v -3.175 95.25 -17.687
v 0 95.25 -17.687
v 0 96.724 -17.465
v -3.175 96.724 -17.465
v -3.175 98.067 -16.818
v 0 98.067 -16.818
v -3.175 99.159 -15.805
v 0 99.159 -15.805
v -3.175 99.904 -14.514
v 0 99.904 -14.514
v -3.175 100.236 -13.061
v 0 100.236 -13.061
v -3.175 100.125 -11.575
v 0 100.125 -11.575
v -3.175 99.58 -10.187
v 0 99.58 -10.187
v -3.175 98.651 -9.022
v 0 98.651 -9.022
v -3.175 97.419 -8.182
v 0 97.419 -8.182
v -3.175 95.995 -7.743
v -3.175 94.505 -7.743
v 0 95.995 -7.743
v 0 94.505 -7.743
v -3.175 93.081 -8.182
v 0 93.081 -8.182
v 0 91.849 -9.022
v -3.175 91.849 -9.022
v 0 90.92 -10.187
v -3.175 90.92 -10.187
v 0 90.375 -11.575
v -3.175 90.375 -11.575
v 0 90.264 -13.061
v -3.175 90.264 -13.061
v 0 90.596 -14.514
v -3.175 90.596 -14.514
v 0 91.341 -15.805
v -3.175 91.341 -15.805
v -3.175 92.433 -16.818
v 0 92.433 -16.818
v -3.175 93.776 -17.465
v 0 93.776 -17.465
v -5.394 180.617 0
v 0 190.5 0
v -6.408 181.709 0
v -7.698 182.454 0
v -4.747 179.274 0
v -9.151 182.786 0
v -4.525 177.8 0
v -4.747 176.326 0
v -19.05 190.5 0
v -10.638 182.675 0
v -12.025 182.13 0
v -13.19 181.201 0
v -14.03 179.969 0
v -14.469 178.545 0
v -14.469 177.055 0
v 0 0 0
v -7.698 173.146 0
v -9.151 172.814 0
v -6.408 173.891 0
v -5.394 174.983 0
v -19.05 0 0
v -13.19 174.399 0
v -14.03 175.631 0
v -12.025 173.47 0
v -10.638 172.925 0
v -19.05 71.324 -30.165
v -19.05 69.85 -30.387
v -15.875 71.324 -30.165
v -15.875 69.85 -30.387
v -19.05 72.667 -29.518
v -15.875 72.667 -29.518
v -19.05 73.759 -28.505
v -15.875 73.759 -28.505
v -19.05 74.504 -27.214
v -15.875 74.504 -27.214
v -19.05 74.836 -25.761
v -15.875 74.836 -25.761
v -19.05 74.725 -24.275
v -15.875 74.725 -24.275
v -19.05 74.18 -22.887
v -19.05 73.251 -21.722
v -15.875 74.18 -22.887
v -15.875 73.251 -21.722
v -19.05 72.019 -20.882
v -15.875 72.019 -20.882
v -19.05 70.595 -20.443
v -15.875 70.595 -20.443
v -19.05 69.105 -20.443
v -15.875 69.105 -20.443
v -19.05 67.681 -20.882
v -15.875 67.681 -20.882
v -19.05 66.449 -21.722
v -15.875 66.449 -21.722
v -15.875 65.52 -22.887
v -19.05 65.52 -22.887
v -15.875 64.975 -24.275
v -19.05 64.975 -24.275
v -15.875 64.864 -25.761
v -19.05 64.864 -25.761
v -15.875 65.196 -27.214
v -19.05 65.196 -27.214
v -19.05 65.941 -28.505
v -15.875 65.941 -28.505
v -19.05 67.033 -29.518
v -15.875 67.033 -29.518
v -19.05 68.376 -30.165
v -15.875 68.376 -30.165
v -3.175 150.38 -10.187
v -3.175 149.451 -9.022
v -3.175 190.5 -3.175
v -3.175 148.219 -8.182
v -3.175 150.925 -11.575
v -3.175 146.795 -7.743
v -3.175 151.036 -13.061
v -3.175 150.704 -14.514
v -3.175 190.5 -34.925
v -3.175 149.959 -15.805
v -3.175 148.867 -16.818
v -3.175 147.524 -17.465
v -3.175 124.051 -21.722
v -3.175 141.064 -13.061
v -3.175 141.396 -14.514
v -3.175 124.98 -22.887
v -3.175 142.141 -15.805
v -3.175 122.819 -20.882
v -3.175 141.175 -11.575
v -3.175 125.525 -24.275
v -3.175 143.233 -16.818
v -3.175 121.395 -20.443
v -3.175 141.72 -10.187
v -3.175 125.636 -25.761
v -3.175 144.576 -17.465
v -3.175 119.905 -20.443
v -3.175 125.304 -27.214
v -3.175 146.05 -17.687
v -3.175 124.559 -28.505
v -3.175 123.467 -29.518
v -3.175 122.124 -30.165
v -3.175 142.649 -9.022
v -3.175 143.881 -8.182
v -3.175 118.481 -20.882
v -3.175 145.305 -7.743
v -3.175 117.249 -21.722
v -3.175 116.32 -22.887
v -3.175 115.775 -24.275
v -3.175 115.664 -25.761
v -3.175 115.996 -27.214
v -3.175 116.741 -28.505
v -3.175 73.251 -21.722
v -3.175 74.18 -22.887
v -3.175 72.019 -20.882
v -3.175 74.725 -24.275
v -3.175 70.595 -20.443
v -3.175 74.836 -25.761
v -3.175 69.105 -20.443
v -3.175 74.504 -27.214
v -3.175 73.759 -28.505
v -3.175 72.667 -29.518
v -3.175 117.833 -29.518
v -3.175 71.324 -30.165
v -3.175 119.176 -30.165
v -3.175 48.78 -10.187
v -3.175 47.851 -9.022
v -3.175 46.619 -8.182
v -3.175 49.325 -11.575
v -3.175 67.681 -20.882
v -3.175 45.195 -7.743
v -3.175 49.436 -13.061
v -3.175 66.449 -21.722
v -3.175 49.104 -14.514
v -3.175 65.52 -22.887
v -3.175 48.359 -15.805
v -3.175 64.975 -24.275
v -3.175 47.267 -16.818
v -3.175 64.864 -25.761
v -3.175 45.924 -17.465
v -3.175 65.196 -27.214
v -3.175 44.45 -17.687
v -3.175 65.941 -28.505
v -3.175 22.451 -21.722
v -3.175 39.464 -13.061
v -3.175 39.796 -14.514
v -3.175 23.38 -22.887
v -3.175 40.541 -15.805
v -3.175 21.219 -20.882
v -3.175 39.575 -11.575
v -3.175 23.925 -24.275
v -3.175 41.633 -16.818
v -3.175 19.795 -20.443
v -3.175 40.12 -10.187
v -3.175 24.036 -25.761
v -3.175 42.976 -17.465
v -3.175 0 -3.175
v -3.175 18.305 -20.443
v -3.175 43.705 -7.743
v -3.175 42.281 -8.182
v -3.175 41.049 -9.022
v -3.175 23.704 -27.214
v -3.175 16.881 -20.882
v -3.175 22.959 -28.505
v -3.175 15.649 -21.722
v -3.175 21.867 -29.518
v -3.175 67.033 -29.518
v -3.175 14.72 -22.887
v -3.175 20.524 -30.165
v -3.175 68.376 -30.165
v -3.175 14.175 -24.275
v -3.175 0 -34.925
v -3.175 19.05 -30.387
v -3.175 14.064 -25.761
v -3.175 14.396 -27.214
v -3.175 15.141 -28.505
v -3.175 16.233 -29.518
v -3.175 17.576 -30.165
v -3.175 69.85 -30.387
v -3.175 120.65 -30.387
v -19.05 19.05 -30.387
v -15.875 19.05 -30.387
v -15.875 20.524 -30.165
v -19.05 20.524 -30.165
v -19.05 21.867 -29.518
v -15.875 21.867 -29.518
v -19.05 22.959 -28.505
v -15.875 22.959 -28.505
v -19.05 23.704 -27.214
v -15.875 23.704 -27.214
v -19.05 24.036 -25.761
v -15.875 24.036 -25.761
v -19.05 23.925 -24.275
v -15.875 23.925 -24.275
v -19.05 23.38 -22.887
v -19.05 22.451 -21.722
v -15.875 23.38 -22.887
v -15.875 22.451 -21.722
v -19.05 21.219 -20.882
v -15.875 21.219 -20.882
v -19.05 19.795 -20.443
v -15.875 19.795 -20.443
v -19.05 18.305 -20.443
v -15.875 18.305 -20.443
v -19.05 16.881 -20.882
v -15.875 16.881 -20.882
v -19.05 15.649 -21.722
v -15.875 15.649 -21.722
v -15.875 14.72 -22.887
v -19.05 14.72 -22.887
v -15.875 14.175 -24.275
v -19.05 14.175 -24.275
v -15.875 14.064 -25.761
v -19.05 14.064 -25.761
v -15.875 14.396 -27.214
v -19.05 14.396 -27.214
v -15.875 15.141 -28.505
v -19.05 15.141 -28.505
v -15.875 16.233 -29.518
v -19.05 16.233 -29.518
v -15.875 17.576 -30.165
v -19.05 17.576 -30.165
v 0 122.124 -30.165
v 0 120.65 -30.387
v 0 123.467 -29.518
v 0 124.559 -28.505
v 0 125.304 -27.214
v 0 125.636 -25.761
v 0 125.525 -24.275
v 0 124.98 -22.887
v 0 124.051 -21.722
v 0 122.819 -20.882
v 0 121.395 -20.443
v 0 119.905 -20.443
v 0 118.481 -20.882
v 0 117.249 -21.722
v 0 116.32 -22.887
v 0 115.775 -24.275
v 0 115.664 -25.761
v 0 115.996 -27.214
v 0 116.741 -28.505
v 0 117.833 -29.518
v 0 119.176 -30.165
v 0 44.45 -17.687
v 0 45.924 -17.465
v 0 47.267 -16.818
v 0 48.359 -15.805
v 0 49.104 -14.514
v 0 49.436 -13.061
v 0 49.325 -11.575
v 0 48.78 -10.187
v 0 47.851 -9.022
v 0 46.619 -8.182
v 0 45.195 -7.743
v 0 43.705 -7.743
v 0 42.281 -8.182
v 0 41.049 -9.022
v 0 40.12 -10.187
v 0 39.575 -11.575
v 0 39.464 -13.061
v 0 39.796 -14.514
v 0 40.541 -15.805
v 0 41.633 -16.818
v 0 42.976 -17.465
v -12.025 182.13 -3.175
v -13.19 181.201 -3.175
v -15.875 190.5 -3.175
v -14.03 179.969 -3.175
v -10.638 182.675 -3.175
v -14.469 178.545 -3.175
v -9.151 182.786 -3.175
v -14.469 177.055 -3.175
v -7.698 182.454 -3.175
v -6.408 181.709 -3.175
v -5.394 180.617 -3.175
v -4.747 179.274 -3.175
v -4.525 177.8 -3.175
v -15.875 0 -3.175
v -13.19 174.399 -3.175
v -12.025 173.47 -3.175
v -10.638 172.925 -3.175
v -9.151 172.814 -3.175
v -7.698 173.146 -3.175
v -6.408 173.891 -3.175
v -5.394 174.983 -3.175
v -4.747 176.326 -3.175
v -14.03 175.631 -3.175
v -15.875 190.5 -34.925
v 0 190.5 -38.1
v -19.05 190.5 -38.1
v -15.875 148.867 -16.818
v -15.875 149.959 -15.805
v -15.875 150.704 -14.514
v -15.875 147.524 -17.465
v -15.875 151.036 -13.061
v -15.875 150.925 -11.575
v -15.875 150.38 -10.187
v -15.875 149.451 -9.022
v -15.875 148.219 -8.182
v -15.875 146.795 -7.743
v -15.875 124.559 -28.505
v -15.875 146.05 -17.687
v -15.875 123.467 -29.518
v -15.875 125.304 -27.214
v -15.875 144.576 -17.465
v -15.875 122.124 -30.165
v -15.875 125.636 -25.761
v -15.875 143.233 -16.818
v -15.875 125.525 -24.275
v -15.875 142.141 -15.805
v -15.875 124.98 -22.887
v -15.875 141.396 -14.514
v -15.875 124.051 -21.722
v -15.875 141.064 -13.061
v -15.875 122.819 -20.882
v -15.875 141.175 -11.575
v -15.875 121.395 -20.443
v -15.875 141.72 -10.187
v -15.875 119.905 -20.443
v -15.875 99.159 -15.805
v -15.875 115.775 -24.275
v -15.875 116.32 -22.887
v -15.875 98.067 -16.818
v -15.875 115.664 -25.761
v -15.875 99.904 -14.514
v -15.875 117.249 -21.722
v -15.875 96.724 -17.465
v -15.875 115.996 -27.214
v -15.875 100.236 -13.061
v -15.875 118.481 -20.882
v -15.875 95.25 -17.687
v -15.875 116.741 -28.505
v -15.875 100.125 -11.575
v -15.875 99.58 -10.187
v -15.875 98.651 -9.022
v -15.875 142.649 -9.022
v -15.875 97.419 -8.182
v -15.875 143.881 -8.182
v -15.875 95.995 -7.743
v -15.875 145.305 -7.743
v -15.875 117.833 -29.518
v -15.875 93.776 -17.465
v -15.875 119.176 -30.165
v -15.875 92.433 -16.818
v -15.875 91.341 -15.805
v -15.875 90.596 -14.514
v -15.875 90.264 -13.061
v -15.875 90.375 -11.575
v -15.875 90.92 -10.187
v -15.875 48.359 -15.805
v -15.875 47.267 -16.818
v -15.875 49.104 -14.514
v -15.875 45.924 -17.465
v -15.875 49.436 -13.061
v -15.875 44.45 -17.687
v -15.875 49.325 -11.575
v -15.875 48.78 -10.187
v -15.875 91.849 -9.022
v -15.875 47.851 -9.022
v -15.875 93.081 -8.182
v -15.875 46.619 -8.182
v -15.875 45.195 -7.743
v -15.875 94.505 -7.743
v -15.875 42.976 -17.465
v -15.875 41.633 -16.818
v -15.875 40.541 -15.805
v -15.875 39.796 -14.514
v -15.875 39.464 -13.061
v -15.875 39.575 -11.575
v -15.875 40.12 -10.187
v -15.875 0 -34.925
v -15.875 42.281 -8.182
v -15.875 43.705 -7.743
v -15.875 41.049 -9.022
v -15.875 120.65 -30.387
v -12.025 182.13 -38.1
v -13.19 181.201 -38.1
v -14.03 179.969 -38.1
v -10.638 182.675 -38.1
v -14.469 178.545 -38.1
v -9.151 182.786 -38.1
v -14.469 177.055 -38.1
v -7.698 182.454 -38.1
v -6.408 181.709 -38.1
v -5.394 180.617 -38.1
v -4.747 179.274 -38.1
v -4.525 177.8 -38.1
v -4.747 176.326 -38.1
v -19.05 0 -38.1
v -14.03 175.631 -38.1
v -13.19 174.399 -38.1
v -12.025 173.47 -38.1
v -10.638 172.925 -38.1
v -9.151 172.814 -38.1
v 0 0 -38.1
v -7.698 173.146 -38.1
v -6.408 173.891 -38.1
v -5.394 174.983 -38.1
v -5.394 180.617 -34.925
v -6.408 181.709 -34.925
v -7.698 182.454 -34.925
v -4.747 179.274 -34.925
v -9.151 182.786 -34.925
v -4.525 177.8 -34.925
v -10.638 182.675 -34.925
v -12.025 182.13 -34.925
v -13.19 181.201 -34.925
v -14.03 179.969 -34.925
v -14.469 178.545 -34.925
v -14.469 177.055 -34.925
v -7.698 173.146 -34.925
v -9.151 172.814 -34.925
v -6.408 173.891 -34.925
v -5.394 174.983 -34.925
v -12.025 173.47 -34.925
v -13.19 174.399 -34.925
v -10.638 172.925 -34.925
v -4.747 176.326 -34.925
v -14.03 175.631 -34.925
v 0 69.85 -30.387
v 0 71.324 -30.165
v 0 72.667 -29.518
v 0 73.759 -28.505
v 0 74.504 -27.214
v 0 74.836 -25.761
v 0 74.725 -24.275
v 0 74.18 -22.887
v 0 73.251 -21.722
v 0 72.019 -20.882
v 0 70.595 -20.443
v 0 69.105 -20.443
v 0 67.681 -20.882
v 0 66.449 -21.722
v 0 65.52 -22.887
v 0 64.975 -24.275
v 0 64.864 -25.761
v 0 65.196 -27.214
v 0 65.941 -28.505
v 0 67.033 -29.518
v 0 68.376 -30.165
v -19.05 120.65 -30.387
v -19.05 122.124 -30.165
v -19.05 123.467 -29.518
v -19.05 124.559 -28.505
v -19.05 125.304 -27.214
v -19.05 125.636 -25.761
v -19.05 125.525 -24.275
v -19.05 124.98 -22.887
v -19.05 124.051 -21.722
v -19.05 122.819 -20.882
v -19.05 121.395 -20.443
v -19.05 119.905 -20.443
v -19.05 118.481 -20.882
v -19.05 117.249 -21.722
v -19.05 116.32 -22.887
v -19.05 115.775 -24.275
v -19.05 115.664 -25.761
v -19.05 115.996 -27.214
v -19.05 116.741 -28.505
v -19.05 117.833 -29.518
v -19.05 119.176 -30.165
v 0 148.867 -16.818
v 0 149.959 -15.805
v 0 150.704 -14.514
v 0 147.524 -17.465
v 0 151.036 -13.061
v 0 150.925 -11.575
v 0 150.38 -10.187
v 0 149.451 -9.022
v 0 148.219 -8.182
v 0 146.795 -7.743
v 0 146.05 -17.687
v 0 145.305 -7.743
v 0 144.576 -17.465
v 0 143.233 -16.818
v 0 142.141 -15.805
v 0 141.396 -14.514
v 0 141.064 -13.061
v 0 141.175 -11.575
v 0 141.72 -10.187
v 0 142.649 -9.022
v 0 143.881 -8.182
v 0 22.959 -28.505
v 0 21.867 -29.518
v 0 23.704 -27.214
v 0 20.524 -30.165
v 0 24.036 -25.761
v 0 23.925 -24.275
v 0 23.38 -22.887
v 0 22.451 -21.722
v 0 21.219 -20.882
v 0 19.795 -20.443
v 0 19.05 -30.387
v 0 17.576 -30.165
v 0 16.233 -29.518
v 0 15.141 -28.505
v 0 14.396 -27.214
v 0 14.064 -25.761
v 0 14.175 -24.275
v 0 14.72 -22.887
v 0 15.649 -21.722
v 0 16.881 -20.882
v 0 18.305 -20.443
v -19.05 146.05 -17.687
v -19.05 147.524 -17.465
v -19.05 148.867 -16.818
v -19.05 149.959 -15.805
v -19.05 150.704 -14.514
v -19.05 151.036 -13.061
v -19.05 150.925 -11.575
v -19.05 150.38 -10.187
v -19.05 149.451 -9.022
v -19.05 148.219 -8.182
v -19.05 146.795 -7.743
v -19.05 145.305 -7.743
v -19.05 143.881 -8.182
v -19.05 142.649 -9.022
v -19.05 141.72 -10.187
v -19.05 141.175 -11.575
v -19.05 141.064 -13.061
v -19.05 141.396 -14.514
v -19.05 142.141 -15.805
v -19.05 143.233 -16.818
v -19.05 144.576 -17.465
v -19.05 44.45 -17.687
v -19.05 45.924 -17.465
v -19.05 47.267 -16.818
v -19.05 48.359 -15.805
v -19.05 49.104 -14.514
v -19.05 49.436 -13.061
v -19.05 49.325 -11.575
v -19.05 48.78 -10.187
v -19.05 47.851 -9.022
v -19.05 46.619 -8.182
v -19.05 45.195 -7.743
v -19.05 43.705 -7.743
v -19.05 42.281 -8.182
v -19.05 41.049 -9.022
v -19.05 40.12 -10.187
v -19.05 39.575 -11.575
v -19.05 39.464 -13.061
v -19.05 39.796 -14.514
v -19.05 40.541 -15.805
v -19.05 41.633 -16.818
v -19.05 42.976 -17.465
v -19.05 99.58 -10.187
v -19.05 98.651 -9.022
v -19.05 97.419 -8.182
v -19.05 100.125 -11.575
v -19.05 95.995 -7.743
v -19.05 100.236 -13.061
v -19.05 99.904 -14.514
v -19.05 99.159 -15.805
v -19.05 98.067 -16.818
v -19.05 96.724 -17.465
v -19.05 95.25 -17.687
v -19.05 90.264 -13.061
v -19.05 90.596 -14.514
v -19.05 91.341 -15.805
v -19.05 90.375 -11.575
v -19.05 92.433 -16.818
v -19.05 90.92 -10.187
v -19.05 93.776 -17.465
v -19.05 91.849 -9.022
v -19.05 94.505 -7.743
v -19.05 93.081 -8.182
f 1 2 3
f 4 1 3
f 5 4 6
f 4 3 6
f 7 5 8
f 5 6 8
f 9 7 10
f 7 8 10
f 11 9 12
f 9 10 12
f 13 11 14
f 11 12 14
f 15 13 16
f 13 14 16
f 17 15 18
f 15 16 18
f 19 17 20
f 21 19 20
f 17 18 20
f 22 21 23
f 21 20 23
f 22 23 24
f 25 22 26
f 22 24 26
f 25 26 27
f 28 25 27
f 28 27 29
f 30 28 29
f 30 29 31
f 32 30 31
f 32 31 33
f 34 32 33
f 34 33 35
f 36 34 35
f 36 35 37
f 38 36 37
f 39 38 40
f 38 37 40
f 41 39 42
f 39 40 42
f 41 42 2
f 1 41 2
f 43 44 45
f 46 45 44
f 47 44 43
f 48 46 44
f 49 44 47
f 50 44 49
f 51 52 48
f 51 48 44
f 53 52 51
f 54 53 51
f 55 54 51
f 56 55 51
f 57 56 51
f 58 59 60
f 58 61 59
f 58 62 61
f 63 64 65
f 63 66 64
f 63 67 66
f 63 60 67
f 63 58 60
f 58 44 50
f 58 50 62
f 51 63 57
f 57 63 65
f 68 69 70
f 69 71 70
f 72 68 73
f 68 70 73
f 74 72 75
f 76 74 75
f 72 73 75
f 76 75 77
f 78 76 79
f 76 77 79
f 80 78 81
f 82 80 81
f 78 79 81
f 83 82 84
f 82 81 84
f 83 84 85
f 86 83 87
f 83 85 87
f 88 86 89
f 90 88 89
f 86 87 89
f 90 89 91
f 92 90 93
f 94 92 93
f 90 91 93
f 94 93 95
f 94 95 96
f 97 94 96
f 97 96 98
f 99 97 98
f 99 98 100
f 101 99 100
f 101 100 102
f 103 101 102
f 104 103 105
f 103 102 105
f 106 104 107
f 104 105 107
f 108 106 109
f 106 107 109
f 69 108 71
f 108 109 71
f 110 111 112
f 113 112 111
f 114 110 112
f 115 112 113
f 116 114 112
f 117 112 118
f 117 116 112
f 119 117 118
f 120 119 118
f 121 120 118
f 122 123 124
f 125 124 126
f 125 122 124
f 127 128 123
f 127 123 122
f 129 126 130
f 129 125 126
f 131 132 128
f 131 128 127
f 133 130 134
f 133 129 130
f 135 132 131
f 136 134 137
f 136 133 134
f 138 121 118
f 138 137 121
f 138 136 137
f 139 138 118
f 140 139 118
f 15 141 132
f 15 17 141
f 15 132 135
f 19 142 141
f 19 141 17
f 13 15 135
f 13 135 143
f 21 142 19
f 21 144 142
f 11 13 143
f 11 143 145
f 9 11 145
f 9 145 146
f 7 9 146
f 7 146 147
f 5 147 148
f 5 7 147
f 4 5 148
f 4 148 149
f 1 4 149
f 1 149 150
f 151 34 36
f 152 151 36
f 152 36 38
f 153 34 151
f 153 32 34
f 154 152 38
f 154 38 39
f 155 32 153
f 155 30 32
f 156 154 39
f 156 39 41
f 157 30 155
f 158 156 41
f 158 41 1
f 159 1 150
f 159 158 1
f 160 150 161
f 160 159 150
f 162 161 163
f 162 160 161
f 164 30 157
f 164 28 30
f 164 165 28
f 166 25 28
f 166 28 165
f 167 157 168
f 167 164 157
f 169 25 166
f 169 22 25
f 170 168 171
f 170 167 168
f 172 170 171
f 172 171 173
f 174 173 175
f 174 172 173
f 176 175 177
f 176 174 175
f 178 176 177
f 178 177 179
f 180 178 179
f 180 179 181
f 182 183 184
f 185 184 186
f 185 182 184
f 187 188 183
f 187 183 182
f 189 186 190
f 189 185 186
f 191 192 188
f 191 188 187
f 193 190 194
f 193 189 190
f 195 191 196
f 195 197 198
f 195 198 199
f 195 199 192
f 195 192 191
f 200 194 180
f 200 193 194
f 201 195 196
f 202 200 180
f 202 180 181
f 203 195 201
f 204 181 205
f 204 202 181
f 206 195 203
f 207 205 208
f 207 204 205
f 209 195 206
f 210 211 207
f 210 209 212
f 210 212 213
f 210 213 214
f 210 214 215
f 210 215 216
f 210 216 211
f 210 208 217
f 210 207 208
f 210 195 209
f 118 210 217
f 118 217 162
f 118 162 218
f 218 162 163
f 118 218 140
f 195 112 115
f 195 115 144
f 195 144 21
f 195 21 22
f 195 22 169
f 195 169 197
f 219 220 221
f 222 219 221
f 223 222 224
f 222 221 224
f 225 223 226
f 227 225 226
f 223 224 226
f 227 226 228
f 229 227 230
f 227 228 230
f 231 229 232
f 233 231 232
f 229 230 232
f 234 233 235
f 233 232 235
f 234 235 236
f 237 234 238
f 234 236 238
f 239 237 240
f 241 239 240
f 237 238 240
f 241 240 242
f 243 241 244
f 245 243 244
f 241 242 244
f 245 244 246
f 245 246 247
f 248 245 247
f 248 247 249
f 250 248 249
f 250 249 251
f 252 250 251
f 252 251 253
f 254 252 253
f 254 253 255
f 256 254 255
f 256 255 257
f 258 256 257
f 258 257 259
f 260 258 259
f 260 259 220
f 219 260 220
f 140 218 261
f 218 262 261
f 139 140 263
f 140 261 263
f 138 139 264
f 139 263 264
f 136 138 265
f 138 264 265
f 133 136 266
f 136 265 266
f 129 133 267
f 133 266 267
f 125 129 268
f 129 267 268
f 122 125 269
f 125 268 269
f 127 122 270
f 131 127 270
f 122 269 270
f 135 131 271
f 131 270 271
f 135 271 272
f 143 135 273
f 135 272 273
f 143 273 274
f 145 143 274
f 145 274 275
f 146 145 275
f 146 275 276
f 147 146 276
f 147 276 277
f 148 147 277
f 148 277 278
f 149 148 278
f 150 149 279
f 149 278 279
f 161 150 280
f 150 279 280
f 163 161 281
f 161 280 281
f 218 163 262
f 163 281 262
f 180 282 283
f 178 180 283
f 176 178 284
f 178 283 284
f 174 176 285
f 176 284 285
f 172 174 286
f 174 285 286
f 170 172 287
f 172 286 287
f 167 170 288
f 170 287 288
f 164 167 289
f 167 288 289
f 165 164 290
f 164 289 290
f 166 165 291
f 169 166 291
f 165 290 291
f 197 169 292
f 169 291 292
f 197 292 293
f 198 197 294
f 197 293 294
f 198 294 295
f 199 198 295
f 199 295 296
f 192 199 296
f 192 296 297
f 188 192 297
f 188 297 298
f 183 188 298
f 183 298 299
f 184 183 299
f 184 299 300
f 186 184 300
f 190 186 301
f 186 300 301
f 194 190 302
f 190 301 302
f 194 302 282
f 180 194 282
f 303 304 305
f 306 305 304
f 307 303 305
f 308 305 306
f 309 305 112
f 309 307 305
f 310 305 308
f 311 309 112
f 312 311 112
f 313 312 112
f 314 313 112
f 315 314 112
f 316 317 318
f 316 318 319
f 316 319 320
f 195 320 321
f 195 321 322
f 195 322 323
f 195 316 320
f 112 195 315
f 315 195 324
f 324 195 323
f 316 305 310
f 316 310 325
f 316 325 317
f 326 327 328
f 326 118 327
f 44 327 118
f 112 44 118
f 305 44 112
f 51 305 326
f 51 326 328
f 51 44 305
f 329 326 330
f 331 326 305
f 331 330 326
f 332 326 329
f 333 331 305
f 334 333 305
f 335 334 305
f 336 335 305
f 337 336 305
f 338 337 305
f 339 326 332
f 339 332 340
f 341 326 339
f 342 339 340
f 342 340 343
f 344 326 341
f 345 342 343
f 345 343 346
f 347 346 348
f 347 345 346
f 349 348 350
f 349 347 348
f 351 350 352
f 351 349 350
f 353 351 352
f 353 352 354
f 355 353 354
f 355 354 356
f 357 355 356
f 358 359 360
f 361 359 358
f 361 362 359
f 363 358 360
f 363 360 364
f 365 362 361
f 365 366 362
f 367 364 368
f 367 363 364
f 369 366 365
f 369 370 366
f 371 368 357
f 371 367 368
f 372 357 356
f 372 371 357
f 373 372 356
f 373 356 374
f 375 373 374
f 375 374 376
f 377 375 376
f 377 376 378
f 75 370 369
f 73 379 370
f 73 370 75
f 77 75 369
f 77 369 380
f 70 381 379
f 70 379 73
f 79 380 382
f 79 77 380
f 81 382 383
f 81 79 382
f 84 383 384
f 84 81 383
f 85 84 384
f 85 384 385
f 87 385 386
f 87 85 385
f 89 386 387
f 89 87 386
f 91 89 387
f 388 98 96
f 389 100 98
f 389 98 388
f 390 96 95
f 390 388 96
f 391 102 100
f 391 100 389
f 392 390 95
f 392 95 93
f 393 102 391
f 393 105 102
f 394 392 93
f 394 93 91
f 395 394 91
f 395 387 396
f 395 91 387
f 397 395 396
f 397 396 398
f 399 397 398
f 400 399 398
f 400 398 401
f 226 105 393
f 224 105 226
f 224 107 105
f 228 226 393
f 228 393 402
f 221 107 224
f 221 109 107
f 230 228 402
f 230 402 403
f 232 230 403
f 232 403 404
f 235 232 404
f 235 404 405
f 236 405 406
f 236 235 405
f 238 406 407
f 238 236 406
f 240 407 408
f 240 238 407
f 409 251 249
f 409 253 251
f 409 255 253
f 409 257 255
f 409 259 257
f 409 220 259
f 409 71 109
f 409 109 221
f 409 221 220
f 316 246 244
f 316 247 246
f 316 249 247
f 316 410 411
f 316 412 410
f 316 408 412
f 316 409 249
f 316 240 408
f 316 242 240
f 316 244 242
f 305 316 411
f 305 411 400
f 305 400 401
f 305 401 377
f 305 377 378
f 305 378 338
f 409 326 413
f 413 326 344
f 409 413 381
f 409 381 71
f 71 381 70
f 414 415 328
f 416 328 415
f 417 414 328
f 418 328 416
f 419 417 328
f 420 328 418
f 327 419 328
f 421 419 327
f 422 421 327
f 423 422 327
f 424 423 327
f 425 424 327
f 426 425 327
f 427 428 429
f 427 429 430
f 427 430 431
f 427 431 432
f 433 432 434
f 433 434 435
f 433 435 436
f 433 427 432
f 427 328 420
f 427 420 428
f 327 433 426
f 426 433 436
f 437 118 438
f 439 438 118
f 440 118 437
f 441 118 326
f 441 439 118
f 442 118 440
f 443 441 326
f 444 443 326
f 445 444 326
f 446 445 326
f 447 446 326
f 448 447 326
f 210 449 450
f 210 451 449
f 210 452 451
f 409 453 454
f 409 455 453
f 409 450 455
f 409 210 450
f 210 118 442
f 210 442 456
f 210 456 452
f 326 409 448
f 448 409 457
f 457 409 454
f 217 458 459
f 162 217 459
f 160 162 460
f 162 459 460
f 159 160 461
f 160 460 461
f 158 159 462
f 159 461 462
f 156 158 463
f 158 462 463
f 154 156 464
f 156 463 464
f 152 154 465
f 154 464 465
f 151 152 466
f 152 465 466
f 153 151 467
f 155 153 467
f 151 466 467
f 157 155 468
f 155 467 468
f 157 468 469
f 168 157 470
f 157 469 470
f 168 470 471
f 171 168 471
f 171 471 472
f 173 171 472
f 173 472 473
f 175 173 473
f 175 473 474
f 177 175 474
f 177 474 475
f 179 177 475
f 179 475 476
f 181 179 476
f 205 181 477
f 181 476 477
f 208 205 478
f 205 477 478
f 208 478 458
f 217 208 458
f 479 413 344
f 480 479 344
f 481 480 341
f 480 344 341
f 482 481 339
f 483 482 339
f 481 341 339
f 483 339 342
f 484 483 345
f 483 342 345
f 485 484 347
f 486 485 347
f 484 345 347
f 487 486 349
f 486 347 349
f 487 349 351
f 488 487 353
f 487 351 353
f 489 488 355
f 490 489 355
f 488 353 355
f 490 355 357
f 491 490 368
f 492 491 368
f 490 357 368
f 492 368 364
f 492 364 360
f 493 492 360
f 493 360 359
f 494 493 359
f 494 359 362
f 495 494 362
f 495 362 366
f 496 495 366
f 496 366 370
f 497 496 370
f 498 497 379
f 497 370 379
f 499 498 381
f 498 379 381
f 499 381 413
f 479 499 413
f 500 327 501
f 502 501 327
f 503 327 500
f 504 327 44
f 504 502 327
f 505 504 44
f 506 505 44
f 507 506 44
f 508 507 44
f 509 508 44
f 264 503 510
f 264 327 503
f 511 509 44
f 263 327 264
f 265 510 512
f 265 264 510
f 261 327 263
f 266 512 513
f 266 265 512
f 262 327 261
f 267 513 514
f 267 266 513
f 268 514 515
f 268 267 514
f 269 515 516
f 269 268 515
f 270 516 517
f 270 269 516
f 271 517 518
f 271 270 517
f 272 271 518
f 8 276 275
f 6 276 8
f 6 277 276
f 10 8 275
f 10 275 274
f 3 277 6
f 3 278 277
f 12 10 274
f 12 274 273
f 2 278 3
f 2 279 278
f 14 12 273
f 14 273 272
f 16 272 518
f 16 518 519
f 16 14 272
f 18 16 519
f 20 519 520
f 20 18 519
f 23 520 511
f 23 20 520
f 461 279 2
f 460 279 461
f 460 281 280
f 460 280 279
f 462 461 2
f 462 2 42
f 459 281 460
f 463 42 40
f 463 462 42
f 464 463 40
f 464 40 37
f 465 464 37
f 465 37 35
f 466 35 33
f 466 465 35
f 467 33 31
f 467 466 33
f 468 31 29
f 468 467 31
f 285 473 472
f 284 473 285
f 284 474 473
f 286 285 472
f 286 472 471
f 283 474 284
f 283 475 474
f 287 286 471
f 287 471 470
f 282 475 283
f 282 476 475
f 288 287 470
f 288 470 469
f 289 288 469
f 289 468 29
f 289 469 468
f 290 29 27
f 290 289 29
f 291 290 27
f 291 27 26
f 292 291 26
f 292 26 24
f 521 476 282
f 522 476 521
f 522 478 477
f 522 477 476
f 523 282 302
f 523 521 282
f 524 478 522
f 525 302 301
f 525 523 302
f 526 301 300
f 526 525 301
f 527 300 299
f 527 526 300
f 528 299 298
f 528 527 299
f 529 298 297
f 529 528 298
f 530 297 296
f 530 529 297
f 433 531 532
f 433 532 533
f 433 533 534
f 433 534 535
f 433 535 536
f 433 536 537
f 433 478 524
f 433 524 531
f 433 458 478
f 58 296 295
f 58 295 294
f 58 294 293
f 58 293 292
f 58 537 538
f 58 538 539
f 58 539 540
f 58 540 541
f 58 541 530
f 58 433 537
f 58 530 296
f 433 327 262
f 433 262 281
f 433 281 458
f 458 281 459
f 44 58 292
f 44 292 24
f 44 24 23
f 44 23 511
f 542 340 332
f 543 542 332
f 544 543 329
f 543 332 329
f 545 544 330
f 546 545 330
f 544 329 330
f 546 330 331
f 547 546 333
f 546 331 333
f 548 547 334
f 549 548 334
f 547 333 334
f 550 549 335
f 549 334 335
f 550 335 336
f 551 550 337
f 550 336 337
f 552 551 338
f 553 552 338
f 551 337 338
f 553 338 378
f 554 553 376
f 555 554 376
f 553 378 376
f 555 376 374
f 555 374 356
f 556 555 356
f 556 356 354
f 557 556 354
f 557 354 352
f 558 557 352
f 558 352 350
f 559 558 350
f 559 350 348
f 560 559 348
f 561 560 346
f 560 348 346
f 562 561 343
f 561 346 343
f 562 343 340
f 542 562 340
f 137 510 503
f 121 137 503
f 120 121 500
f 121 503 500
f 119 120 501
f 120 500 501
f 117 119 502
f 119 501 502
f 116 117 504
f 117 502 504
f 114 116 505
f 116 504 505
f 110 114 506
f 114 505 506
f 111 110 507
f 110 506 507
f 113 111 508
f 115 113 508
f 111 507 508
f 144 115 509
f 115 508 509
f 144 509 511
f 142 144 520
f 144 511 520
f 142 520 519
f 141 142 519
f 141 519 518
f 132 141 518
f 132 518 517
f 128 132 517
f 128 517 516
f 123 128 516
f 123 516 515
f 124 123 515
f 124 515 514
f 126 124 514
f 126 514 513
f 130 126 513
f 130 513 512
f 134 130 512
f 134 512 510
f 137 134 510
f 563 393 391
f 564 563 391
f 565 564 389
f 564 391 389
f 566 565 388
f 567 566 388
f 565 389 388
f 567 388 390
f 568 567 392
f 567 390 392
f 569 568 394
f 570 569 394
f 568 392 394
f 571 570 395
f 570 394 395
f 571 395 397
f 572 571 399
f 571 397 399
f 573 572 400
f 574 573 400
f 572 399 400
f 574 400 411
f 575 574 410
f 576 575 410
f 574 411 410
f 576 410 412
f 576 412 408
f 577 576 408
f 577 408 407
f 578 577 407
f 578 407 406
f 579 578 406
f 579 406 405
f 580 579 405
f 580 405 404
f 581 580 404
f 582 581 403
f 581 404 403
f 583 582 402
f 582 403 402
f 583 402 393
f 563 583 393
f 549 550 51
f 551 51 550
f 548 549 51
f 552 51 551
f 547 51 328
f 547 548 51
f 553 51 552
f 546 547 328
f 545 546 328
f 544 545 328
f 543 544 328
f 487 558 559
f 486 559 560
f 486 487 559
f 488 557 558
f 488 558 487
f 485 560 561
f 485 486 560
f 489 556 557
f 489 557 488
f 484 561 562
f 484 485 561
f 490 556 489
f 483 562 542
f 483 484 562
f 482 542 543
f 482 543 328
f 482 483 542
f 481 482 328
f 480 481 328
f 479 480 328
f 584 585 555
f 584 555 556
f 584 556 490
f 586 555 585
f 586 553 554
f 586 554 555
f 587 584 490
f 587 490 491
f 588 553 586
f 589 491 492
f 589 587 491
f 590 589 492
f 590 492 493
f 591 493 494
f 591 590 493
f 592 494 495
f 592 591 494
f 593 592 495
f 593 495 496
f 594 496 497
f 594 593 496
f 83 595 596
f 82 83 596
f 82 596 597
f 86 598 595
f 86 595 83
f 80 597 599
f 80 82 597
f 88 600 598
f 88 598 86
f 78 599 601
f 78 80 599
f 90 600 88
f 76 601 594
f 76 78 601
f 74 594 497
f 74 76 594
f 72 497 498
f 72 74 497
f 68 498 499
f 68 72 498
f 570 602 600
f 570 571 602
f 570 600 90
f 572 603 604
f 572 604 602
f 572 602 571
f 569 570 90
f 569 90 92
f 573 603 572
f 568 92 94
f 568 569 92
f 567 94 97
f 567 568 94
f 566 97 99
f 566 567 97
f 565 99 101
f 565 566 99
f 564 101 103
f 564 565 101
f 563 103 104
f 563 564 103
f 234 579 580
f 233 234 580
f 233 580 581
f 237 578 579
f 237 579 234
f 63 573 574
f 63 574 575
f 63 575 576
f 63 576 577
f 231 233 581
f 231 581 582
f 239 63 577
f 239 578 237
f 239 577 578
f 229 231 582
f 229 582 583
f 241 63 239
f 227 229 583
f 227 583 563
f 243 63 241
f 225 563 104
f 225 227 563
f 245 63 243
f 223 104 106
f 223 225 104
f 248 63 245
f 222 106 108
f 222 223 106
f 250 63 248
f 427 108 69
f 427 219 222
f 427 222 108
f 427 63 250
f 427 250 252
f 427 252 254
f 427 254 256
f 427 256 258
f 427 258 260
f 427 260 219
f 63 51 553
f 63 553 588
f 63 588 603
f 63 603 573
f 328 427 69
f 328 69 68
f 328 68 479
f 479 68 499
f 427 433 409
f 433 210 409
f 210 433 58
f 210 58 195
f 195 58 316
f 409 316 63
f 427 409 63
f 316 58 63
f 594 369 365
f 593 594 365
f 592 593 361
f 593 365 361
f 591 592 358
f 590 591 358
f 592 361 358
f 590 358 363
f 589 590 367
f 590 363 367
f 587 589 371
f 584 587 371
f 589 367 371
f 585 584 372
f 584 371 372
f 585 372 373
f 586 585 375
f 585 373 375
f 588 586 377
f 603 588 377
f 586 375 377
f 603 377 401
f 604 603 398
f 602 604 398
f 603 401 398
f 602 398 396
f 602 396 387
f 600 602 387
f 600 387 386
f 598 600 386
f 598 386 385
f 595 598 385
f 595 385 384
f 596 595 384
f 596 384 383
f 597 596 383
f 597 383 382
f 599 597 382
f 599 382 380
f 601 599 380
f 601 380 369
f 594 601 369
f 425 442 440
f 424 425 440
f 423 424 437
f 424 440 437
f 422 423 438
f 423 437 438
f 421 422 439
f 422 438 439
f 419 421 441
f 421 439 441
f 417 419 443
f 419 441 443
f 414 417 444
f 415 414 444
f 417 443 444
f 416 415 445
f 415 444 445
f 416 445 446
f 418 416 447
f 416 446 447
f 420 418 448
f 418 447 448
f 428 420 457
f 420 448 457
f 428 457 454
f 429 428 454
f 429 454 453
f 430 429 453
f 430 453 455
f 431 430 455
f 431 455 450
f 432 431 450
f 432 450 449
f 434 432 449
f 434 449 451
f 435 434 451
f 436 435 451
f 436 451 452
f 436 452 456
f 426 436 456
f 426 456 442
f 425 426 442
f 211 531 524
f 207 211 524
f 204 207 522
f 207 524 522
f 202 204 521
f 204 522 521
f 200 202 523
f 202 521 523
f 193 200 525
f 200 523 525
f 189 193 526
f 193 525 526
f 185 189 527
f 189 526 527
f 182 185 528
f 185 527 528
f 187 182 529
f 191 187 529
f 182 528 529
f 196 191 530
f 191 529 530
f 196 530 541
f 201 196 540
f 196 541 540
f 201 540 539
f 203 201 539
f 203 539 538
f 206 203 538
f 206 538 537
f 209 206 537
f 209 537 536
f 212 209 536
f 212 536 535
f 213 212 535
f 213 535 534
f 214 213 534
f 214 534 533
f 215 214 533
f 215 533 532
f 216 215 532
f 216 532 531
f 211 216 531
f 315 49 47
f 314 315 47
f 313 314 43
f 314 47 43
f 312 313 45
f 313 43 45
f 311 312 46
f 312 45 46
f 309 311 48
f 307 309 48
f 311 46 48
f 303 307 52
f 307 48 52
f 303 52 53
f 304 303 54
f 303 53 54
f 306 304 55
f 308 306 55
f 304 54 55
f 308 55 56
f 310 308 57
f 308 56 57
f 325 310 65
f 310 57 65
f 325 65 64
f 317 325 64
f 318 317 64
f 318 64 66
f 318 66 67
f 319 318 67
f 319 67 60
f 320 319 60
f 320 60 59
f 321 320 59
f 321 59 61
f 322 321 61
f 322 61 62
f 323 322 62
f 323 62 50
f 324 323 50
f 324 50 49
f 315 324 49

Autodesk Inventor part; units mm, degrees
ref_plane "YZ Plane" through (0, 0, 0) normal (1, 0, 0) x (0, 1, 0)
ref_plane "XZ Plane" through (0, 0, 0) normal (0, 1, 0) x (-1, 0, 0)
ref_plane "XY Plane" through (0, 0, 0) normal (0, 0, 1) x (1, 0, 0)
sketch "Sketch1" plane through (0, 0, 0) normal (0, 1, 0) x (-1, 0, 0)
  line L0 (0, 0) -> (19.05, 0)
  line L1 (19.05, 0) -> (19.05, -38.1)
  line L2 (19.05, -38.1) -> (0, -38.1)
  line L3 (0, -38.1) -> (0, 0)
  line L4 (15.875, -34.925) -> (15.875, -3.175)
  line L5 (15.875, -3.175) -> (3.175, -3.175)
  line L6 (3.175, -3.175) -> (3.175, -34.925)
  line L7 (3.175, -34.925) -> (15.875, -34.925)
  dimension "d0" = 19.05
  dimension "d1" = 38.1
  dimension "d2" = 3.175
extrude "Extrusion1" add sketch "Sketch1" along normal blind 190.5
sketch "Sketch2" plane through (-19.05, 0, 0) normal (0, 0, 1) x (1, 0, 0)
  circle A0 centre (9.525, 177.8) radius 5
  line L0 (15.875, 0) -> (15.875, 190.5) projected
  line L1 (0, 0) -> (19.05, 0) projected
  line L2 (19.05, 0) -> (19.05, 190.5) projected
  line L3 (0, 190.5) -> (19.05, 190.5) projected
  line L4 (0, 0) -> (0, 190.5) projected
  point P0 (9.525, 190.5)
  dimension "d5" = 10
  dimension "d6" = 9.525
  dimension "d7" = 12.7
extrude "Extrusion2" cut sketch "Sketch2" against normal blind 204.7875 contours A0
sketch "Sketch3" plane through (0, 0, 0) normal (1, 0, 0) x (0, 0, -1)
  line L0 (25.3873, 190.5) -> (25.3873, 0)
  line L1 (38.1, 190.5) -> (38.1, 0)
  line L2 (38.1, 0) -> (0, 0) projected
  line L3 (38.1, 190.5) -> (25.3873, 190.5)
  line L4 (38.1, 0) -> (38.1, 190.5) projected
  line L5 (25.3873, 190.5) -> (38.1, 190.5)
  line L6 (38.1, 190.5) -> (0, 190.5)
  line L7 (0, 190.5) -> (38.1, 190.5) projected
  line L8 (12.6873, 190.5) -> (12.6873, 0)
  circle A0 centre (25.3873, 19.05) radius 5
  circle A1 centre (12.6873, 44.45) radius 5
  circle A2 centre (25.3873, 69.85) radius 5
  circle A3 centre (25.3873, 120.65) radius 5
  circle A4 centre (12.6873, 95.25) radius 5
  circle A5 centre (12.6873, 146.05) radius 5
  dimension "d10" = 12.7
  dimension "d11" = 10
  dimension "d12" = 10
  dimension "d15" = 50.8
  dimension "d20" = 19.05
  dimension "d21" = 25.4
  dimension "d24" = 50.8
extrude "Extrusion3" cut sketch "Sketch3" against normal blind 204.7875 contours A3 L0 | L0 A3 | A5 L8 | L8 A5 | A2 L0 | L0 A2 | A0 L0 | L0 A0 | A4 L8 | L8 A4 | A1 L8 | L8 A1
properties part number "hinge base"
